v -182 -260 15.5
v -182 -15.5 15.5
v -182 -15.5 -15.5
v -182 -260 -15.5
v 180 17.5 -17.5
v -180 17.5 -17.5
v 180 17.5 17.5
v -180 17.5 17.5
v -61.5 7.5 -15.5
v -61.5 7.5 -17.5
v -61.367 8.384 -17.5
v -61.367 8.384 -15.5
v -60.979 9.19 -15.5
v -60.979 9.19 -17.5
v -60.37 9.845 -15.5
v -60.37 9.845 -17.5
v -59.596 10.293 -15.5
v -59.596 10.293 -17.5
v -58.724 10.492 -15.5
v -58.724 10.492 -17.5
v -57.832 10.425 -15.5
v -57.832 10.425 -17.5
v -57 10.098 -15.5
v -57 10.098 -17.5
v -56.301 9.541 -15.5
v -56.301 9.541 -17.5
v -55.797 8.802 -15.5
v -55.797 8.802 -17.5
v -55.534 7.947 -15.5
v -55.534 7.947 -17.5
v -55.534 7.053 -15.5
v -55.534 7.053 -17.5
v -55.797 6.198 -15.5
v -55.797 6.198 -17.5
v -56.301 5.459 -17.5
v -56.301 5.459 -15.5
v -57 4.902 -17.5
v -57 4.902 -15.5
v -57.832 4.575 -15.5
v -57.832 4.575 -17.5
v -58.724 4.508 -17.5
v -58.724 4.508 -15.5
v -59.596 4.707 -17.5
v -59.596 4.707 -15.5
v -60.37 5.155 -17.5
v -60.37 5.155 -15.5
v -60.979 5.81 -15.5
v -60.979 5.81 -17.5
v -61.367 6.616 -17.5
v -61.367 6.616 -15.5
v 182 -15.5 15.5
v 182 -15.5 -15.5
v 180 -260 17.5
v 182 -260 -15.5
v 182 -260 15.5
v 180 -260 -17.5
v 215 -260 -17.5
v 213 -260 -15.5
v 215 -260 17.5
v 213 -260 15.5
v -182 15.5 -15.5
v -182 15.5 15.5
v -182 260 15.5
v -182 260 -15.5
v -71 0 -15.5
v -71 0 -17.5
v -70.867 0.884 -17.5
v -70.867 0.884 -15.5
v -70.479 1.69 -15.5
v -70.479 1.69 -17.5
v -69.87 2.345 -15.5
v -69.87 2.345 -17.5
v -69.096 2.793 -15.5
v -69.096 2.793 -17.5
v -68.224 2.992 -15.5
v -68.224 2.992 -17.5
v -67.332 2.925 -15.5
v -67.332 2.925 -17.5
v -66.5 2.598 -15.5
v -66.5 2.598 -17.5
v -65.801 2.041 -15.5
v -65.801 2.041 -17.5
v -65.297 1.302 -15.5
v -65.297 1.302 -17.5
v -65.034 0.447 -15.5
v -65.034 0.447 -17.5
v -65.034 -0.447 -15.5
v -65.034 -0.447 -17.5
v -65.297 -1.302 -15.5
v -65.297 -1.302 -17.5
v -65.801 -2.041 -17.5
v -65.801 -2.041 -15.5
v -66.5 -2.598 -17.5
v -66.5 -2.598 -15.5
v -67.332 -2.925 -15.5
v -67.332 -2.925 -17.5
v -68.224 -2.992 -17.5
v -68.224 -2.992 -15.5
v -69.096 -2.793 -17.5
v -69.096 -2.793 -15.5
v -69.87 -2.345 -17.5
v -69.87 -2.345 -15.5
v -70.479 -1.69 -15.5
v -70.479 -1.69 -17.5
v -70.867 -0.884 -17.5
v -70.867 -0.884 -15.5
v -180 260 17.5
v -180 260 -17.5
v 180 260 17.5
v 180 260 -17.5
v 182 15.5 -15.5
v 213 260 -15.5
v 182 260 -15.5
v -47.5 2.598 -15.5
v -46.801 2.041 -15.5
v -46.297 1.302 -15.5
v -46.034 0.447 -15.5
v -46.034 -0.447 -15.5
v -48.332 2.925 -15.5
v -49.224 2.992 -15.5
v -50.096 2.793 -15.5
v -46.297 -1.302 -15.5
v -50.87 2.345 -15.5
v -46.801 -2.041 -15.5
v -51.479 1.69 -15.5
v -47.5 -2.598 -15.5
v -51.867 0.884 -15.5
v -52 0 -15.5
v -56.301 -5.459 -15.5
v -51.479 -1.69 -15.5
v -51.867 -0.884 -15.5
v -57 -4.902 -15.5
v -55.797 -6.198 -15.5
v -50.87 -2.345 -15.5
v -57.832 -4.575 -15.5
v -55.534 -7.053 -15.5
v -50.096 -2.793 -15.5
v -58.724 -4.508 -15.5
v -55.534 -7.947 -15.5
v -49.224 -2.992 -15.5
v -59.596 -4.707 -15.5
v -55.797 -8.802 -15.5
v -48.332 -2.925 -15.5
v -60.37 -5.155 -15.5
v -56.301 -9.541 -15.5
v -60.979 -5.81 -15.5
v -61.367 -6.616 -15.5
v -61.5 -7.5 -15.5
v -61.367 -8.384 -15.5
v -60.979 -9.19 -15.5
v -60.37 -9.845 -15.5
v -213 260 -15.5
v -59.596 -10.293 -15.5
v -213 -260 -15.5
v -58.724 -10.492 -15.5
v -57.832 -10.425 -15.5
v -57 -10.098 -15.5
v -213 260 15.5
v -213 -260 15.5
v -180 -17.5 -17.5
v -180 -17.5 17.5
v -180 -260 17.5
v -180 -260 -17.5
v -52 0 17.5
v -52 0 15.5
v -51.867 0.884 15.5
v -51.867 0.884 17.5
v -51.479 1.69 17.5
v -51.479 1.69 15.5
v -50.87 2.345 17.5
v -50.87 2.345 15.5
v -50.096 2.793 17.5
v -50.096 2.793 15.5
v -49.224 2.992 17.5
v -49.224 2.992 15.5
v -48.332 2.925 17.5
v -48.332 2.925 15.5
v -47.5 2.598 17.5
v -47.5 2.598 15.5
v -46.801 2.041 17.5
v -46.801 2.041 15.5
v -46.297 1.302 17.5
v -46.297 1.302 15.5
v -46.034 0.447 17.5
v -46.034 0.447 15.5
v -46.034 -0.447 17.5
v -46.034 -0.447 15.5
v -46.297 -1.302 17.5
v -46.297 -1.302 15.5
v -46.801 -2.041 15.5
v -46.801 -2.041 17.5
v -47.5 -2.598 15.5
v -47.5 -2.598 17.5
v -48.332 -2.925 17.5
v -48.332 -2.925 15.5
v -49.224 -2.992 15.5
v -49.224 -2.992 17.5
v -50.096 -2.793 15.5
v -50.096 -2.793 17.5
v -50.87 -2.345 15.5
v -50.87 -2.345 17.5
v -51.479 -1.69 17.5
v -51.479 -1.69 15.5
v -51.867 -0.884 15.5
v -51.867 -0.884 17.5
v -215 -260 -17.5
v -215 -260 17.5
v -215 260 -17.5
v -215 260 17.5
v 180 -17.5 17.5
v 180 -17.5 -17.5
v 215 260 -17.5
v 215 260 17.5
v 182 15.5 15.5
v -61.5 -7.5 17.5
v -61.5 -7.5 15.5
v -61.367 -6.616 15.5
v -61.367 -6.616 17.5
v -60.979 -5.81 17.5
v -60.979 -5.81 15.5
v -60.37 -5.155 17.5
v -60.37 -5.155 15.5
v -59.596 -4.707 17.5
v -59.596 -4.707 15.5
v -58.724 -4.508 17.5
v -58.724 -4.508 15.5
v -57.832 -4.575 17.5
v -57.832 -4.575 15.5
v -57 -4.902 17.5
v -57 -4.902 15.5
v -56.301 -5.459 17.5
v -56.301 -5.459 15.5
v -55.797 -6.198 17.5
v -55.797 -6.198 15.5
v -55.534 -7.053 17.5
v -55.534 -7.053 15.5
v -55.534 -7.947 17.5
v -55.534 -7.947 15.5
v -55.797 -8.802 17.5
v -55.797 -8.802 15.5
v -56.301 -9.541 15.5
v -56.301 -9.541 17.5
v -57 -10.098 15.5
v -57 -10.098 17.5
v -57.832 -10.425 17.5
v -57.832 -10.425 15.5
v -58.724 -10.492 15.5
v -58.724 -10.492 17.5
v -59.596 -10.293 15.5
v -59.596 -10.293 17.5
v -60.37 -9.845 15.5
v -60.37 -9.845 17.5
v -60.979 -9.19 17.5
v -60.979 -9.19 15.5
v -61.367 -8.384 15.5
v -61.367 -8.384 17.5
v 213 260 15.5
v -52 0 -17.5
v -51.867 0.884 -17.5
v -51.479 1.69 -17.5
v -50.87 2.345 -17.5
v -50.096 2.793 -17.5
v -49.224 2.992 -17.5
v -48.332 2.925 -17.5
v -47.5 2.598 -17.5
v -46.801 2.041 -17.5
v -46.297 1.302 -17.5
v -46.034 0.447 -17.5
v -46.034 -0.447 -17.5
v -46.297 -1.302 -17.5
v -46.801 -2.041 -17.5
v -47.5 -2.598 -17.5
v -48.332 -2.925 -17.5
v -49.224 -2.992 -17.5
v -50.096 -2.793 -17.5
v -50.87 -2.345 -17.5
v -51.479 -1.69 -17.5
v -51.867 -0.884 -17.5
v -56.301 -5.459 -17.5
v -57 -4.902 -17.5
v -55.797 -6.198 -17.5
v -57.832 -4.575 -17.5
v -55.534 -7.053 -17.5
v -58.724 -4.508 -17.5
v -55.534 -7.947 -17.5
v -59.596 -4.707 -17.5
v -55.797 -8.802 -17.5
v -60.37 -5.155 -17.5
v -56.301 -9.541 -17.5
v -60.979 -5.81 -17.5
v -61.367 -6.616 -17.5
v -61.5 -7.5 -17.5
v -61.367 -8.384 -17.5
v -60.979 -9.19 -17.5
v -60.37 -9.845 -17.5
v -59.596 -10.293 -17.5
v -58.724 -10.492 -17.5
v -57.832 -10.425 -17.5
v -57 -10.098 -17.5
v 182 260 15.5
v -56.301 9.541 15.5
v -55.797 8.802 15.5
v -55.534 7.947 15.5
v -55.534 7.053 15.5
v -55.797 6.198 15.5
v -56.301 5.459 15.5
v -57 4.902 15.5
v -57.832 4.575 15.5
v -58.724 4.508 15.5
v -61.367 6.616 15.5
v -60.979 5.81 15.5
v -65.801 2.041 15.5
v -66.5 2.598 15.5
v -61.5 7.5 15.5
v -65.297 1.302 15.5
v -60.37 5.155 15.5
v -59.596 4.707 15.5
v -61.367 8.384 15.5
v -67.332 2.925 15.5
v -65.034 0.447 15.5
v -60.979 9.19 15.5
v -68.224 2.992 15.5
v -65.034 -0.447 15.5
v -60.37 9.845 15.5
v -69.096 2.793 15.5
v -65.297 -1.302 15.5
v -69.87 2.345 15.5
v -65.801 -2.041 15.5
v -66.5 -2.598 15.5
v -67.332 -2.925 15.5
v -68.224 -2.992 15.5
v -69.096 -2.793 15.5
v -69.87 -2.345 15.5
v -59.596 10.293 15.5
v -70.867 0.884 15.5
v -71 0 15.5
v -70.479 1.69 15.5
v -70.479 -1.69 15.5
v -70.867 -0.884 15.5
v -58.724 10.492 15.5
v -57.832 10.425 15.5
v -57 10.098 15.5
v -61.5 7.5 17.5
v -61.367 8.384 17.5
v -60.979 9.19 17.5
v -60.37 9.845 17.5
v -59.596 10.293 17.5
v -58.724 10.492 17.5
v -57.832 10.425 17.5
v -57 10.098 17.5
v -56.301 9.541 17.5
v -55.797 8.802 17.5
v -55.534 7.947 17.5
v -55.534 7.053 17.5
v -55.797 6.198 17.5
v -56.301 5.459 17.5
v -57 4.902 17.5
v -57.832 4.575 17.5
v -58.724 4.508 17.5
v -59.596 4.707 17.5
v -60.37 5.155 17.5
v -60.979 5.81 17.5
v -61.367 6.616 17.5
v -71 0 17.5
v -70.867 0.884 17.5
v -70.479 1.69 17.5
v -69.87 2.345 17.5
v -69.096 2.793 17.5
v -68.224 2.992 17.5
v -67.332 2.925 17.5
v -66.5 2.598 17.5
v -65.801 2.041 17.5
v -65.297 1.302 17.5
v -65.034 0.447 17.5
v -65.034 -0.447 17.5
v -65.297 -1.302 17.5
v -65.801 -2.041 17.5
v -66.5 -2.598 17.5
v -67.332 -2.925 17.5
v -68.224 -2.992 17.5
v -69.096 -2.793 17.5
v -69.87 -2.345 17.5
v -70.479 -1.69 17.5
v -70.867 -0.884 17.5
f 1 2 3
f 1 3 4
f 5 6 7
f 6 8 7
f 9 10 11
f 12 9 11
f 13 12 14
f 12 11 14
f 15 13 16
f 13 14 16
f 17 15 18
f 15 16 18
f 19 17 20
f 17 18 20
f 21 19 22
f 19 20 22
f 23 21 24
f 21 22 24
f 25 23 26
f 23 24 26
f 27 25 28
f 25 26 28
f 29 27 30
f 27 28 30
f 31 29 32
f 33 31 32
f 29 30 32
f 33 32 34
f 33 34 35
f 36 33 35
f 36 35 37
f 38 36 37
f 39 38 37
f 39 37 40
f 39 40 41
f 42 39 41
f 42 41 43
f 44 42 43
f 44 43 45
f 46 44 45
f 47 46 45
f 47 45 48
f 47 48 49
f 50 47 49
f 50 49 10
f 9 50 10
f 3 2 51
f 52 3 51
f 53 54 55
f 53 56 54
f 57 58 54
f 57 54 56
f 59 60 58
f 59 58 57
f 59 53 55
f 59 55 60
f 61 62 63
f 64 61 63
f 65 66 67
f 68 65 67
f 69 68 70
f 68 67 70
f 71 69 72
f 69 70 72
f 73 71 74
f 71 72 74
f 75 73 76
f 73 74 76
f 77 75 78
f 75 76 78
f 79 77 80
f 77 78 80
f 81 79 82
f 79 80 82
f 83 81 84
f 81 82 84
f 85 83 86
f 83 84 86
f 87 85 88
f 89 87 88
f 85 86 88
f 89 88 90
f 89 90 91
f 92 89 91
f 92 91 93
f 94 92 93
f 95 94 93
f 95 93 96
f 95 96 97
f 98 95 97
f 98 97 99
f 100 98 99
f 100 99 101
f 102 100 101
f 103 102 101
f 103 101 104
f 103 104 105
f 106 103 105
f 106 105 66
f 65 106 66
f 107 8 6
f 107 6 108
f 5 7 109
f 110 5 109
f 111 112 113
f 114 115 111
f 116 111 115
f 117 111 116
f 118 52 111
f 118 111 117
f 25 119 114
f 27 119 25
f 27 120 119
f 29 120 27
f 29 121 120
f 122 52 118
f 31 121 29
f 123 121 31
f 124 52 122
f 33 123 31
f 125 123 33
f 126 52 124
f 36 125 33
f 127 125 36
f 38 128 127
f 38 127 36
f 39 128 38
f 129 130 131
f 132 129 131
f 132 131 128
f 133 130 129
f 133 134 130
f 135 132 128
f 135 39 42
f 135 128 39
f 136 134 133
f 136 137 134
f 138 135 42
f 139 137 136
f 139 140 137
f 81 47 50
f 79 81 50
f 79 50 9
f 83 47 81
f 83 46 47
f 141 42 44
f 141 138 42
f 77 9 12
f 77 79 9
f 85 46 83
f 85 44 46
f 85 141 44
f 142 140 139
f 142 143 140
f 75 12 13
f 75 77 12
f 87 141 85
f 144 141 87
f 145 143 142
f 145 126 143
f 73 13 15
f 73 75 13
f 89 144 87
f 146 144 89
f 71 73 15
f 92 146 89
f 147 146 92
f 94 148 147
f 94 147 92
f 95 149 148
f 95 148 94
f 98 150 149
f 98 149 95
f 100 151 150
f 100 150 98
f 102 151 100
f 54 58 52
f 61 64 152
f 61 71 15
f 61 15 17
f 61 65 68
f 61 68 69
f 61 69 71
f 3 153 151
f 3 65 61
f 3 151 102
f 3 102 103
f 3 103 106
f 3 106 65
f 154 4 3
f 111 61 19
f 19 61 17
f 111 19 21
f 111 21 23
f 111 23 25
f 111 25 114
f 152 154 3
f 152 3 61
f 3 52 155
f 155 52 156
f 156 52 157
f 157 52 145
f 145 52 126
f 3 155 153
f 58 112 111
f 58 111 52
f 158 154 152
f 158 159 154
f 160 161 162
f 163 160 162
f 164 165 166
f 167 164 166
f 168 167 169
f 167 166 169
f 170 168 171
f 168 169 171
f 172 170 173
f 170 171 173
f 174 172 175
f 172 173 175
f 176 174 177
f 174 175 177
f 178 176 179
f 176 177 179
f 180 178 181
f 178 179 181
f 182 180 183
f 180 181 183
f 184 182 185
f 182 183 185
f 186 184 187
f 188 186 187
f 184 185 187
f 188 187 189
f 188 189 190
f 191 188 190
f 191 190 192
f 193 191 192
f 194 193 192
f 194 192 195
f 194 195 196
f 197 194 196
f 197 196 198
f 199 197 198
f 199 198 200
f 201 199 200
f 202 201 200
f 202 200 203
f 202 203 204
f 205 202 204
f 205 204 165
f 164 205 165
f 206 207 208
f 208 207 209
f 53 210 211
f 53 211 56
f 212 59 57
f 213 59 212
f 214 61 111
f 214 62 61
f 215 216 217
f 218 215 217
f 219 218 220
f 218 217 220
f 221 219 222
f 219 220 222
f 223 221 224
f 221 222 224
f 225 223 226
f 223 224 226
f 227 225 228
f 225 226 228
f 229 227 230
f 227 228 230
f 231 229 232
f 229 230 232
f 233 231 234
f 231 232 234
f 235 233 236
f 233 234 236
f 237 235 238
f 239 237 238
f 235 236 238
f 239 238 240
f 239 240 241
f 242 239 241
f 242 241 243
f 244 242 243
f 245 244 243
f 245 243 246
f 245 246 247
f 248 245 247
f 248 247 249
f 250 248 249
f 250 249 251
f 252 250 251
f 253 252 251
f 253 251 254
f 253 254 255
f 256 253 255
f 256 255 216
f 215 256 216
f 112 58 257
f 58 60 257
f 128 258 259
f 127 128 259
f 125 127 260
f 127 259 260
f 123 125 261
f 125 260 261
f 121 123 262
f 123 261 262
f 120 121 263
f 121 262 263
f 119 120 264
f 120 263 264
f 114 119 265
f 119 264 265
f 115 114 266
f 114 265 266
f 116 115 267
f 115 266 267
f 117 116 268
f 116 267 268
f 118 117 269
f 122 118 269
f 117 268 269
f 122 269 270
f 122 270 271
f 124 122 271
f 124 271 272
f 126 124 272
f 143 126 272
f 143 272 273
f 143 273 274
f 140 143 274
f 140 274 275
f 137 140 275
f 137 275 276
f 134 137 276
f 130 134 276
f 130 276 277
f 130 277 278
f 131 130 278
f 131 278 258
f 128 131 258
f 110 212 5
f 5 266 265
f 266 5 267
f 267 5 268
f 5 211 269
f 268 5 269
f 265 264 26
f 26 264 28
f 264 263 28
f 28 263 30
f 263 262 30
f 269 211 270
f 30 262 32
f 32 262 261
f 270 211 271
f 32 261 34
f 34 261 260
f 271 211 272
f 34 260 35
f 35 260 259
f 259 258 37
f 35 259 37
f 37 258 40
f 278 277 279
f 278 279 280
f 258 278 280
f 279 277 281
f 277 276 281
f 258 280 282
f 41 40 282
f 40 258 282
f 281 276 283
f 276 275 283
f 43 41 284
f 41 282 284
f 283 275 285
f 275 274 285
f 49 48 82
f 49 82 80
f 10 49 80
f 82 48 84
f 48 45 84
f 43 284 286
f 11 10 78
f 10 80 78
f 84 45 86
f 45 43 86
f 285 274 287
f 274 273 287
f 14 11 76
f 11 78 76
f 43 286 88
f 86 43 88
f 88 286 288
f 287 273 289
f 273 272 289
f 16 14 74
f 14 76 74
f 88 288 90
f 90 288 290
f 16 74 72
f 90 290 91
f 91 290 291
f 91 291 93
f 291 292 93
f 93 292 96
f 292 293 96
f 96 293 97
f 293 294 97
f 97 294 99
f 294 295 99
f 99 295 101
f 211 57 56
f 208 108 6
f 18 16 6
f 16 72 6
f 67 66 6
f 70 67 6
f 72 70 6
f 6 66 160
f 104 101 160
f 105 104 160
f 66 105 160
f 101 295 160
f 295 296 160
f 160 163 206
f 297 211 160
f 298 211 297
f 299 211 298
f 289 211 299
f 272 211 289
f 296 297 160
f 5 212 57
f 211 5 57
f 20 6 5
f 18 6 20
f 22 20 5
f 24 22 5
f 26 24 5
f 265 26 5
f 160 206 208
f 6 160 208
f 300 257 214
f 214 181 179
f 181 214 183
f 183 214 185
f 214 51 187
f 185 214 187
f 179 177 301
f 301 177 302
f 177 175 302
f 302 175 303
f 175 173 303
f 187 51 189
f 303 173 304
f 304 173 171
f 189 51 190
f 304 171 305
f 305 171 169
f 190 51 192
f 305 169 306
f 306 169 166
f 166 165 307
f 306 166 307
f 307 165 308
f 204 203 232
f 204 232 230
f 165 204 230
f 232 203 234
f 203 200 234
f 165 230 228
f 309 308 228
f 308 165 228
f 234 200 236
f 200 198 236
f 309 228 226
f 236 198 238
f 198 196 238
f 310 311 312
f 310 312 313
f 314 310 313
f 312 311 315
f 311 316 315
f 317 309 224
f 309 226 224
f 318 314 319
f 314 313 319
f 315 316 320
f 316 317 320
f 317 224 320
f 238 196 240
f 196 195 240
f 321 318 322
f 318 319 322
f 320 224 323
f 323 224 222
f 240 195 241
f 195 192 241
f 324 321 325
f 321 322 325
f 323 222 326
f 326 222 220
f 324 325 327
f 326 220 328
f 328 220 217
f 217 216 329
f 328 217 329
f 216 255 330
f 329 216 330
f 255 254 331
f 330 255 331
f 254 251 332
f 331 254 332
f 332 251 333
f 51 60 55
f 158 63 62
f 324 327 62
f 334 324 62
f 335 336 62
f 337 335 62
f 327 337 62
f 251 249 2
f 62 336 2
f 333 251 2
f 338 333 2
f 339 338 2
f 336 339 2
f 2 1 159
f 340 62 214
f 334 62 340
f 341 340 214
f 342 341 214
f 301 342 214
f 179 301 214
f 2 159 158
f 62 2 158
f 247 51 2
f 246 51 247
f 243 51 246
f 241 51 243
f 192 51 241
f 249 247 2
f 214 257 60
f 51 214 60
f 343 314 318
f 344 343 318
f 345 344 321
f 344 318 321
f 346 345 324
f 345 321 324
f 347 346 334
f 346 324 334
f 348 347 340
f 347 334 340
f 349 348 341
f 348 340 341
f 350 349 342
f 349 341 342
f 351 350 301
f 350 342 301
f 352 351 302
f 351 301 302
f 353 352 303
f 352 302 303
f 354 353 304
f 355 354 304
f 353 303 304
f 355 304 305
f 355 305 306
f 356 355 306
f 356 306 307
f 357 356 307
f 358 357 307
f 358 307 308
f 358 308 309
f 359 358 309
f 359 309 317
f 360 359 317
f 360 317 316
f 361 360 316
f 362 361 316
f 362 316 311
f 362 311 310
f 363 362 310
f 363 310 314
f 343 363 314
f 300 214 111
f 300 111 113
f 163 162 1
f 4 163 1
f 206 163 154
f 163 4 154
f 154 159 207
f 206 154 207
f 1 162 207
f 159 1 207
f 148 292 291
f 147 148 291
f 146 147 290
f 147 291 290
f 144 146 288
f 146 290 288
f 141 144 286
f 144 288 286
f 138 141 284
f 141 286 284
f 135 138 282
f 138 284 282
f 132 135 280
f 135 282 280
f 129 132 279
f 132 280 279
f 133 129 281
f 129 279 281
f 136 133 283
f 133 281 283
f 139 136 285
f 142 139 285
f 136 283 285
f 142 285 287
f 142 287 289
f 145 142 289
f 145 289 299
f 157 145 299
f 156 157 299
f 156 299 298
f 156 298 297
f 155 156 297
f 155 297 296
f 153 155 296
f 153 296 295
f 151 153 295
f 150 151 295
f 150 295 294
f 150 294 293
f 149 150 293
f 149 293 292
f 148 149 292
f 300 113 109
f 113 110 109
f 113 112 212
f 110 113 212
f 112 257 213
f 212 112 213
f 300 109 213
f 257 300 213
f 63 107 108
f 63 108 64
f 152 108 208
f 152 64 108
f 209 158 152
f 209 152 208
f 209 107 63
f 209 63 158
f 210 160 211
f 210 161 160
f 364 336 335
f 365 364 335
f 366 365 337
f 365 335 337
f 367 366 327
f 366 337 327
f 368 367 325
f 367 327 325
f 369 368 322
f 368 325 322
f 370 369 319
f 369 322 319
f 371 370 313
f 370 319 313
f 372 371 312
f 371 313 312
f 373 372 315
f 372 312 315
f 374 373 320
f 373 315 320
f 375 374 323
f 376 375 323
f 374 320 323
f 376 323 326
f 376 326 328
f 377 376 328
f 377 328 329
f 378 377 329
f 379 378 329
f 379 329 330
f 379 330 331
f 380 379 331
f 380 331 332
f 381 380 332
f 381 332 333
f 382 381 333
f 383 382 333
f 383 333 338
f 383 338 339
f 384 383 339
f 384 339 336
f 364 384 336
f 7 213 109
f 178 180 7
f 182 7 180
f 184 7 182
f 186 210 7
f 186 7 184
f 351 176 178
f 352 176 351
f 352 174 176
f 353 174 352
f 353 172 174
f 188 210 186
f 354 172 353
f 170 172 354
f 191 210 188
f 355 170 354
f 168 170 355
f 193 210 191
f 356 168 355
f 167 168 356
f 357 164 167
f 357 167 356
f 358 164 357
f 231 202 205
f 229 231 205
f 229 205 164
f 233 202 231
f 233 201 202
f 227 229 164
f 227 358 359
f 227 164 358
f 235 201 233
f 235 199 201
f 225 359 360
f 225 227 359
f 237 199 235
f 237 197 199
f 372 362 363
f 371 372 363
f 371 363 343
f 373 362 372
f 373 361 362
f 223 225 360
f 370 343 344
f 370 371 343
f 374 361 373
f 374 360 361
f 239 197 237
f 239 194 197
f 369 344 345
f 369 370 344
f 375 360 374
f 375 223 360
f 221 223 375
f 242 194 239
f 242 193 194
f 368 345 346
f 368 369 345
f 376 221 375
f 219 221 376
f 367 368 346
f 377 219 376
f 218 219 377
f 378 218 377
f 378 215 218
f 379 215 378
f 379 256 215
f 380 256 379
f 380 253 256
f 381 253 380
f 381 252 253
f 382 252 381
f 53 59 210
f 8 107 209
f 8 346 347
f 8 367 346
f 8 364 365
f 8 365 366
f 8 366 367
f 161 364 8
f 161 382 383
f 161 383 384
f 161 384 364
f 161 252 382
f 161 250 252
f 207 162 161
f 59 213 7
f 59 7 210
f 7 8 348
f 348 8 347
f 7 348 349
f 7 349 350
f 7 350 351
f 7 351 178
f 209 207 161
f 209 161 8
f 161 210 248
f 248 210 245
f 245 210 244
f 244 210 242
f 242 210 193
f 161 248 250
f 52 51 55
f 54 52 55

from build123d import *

# Parameters (mm, degrees)
F1_DEPTH = 17.5
F4_T     = -2
F6_D     = 6


with BuildPart() as f1:
    # F0 (on Top) → F1 (new body, symmetric)
    with BuildSketch(Plane.XY):
        Polygon((0, 0), (0, 17.5), (-180, 17.5), (-180, 260), (-215, 260), (-215, 0), align=None)
    extrude(amount=F1_DEPTH, both=True)

    # F2: F1 across plane


with BuildPart() as f1_1:
    add(f1.part)
    add(f1.part.mirror(Plane.XZ))

    # F3: F1 across plane


with BuildPart() as f1_2:
    add(f1_1.part)
    add(f1_1.part.mirror(Plane.YZ))

    # F4
    f4_openings = [f1_2.faces().sort_by_distance(p)[0] for p in [
        (-197.5, -260, 0),
        (197.5, -260, 0),
        (197.5, 260, 0),
        (-197.5, 260, 0),
    ]]
    offset(amount=F4_T, openings=f4_openings, kind=Kind.INTERSECTION)

    # F6 (through all)
    with Locations(Plane.XY.offset(17.5)):
        with Locations((-68, 0), (-58.5, 7.5), (-49, 0), (-58.5, -7.5)):
            Hole(F6_D / 2)


solid = f1_2.part
